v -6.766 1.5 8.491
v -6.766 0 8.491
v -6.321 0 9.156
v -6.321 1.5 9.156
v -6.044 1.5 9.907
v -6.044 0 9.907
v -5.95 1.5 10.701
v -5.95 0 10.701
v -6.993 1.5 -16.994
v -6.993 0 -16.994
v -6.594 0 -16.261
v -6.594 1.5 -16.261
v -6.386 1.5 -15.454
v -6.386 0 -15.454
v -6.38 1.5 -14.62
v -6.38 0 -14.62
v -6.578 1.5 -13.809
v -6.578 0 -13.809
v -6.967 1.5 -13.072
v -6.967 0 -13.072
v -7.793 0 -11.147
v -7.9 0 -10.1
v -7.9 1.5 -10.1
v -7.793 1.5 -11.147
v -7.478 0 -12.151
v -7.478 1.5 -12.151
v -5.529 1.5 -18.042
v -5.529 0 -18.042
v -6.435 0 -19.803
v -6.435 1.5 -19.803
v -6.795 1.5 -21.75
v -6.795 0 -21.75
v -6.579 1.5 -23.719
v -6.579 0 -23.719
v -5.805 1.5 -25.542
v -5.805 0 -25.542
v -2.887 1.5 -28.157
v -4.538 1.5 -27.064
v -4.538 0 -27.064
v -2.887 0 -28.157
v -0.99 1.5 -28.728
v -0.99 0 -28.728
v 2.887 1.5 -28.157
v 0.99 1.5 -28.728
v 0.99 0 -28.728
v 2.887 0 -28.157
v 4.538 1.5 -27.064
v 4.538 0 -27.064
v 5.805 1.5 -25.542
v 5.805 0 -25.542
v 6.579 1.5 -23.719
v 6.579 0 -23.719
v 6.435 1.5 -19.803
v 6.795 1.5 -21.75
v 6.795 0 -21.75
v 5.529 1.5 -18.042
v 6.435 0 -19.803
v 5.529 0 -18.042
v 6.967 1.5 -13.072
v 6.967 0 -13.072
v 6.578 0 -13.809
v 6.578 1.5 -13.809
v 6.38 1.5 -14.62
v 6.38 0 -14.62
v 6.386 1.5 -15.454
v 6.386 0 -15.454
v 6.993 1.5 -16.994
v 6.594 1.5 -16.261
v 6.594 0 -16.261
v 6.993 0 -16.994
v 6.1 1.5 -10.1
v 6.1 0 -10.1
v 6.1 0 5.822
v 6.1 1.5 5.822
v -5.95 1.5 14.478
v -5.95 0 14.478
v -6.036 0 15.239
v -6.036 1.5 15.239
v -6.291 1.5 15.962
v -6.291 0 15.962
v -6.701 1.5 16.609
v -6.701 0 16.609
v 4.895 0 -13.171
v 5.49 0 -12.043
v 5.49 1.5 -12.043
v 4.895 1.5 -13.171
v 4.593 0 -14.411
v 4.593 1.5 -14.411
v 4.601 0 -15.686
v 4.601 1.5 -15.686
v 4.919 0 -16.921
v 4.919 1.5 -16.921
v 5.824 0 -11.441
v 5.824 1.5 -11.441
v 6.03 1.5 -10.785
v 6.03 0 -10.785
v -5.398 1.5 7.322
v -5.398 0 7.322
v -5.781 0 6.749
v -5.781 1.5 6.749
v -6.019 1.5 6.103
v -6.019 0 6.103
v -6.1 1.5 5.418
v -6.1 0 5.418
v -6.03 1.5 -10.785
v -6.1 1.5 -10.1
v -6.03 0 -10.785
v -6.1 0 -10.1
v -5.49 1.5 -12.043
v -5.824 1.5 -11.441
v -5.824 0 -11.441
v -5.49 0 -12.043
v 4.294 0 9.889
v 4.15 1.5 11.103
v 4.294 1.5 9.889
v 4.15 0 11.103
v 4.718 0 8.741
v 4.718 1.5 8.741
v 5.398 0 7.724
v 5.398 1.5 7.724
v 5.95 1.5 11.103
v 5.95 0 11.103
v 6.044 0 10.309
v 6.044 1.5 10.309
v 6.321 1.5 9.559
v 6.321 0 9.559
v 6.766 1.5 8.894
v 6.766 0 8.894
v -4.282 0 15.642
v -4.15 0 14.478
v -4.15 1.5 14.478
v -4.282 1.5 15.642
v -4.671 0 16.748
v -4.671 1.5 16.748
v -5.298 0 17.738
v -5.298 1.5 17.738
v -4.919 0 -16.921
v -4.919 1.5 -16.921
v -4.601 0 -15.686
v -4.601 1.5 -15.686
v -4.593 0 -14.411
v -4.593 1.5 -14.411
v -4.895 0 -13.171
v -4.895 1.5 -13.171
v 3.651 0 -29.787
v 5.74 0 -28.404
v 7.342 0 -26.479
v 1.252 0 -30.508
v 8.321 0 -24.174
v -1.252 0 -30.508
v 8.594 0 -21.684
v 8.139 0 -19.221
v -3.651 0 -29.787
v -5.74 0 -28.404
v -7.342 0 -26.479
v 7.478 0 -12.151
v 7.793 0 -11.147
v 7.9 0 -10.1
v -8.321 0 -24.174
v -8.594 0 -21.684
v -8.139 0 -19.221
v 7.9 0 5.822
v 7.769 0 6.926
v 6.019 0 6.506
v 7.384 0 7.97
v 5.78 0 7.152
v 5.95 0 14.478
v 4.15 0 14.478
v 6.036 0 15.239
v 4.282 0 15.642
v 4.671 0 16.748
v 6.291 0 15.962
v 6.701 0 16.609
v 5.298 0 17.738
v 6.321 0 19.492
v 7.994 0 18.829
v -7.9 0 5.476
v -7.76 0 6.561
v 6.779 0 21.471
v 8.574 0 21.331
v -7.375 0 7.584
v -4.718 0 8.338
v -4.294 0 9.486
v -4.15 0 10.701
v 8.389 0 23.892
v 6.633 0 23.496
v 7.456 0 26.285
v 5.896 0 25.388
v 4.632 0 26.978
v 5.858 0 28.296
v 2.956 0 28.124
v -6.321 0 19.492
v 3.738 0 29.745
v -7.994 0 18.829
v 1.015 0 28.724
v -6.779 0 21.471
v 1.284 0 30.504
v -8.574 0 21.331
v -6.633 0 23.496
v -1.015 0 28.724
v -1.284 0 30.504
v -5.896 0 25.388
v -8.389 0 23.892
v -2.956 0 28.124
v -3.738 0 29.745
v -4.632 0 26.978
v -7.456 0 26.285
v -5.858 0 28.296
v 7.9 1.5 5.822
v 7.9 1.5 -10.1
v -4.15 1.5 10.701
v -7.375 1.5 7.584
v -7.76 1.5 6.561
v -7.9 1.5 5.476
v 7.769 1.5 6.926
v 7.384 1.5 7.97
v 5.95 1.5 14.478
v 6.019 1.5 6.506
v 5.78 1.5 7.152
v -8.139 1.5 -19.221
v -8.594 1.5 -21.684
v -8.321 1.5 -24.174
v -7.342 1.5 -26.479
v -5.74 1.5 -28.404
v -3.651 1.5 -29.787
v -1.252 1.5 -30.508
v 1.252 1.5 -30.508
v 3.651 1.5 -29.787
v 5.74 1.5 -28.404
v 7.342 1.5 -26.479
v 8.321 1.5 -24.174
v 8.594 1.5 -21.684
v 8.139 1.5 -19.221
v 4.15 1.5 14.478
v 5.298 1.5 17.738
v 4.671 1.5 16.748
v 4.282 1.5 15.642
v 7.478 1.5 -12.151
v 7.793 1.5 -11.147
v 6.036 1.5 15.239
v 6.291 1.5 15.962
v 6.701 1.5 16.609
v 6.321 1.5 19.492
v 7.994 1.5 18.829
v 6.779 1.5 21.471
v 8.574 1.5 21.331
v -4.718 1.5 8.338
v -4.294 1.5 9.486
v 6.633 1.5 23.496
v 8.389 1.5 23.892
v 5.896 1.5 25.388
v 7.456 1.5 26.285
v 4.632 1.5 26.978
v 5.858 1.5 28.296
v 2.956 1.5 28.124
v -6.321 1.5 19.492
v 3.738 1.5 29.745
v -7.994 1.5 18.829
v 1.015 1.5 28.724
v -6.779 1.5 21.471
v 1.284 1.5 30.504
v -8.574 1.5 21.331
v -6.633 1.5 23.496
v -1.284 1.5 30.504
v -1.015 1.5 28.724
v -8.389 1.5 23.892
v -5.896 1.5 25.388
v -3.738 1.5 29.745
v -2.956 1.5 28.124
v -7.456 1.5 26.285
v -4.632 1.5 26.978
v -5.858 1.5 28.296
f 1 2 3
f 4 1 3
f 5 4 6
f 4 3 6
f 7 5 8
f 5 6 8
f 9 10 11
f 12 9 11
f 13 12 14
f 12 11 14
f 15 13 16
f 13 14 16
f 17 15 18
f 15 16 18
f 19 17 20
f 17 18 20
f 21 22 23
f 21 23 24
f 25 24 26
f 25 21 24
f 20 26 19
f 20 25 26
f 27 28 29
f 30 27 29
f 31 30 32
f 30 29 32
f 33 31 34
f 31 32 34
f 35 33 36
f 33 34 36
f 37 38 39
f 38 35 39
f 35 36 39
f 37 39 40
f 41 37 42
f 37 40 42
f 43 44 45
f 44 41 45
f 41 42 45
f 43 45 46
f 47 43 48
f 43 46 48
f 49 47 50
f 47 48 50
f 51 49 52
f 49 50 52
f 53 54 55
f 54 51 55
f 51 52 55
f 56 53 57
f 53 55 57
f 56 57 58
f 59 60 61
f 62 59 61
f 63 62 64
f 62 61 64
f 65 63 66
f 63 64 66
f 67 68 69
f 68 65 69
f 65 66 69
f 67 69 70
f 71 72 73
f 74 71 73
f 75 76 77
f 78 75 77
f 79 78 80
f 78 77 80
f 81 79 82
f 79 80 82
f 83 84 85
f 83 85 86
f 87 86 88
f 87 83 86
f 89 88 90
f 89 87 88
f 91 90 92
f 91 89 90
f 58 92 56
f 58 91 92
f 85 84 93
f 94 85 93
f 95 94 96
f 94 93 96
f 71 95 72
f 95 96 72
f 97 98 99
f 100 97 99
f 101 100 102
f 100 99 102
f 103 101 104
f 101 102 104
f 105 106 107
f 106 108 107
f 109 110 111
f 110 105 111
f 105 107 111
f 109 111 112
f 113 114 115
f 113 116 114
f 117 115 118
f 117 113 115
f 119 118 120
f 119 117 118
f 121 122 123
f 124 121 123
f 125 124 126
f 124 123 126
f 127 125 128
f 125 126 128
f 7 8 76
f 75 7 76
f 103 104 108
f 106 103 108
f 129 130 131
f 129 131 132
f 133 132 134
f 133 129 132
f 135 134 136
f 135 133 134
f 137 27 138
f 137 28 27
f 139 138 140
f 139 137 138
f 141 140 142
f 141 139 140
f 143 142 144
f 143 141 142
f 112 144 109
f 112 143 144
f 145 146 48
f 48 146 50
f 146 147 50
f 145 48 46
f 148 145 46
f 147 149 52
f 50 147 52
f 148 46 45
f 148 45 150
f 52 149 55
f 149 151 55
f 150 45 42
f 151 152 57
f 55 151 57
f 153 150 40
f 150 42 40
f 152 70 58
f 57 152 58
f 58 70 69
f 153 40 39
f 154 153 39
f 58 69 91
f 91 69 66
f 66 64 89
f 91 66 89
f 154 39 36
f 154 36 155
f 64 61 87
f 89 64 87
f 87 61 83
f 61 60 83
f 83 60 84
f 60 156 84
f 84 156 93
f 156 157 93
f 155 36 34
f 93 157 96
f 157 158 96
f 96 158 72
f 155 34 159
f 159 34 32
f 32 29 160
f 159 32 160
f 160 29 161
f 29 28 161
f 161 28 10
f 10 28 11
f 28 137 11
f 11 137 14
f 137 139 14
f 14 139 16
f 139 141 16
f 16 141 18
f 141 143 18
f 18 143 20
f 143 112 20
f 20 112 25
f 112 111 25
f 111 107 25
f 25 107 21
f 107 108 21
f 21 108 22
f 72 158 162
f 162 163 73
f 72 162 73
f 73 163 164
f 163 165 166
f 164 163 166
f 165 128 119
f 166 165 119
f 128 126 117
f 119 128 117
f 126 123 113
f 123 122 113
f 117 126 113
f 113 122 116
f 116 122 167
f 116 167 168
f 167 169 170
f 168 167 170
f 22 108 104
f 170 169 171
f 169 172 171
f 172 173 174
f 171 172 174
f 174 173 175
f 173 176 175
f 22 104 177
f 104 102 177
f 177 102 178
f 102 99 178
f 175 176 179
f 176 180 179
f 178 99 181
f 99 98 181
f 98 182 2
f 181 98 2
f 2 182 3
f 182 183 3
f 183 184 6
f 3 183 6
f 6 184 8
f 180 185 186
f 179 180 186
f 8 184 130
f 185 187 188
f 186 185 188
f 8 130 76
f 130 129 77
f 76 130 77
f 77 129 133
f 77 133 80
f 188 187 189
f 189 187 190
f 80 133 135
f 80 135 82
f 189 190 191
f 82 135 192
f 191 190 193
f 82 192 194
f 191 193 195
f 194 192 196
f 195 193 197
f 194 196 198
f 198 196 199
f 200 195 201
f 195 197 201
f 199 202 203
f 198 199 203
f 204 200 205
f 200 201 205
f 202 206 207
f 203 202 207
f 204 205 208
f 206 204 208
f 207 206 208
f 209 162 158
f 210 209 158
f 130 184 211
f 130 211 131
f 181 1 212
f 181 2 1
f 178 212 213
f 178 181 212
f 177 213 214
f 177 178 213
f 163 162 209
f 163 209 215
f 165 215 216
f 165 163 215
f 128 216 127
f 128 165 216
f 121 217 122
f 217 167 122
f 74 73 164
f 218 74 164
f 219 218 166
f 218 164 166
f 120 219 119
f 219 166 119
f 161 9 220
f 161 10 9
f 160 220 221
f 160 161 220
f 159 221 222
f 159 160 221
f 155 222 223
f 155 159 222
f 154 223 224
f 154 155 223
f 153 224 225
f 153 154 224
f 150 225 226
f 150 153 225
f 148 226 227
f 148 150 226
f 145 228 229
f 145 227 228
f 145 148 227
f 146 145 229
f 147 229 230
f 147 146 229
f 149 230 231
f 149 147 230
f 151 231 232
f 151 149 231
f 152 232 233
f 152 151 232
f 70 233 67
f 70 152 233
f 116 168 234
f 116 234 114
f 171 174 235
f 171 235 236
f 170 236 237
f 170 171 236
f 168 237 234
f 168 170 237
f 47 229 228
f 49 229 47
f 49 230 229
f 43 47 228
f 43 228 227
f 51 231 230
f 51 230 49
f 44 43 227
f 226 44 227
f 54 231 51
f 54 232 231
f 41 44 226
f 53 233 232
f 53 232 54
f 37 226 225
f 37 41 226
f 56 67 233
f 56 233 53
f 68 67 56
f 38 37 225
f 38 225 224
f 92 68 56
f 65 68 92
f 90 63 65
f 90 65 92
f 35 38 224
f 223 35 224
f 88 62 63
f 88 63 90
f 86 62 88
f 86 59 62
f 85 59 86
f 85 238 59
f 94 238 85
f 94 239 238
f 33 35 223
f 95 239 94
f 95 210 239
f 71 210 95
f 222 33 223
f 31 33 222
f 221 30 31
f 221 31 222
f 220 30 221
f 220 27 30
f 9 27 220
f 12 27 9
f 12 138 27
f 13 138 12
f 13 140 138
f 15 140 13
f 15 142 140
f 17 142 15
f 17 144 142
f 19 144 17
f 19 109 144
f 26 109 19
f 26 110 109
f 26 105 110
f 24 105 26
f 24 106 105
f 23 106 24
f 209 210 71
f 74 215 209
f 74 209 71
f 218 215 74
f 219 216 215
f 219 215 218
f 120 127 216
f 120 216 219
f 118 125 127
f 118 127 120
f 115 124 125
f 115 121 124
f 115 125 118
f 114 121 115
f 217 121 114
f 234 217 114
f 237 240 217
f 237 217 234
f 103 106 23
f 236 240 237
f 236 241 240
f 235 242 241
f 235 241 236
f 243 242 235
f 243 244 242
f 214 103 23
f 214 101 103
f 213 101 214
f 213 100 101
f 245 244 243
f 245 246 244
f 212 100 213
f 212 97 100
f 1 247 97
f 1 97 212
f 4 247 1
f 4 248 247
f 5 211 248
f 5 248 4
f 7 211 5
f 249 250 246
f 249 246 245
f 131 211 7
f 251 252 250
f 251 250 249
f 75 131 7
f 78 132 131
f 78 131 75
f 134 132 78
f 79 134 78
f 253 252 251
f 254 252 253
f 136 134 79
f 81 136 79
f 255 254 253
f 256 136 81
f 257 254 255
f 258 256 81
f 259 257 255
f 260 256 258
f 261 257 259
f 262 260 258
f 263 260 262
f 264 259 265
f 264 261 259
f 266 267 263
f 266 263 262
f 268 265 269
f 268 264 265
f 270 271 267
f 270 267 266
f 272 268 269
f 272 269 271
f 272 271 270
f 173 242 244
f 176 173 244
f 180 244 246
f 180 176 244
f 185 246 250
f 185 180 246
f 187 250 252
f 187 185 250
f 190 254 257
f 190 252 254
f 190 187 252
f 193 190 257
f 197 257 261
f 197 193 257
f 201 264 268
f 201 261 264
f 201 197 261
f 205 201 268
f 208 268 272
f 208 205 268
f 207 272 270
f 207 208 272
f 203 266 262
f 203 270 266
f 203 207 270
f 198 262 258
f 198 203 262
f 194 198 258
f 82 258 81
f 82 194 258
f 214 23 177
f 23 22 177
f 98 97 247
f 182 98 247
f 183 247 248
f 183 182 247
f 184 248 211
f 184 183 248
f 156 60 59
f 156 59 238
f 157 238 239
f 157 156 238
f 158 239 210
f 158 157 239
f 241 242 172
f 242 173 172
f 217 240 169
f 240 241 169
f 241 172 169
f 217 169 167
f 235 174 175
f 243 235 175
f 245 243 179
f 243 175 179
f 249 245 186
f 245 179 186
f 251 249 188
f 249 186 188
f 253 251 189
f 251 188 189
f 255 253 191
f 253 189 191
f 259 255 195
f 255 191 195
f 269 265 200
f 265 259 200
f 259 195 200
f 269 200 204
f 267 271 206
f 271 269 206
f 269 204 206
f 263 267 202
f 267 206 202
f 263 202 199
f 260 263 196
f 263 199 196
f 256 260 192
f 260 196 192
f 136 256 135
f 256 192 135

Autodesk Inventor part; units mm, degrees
ref_plane "YZ Plane" through (0, 0, 0) normal (1, 0, 0) x (0, 1, 0)
ref_plane "XZ Plane" through (0, 0, 0) normal (0, 1, 0) x (-1, 0, 0)
ref_plane "XY Plane" through (0, 0, 0) normal (0, 0, 1) x (1, 0, 0)
sketch "Sketch1" plane through (0, 0, 0) normal (0, 1, 0) x (-1, 0, 0)
  line L0 (13.9, 33.875) -> (-13.9, 33.875)
  line L1 (-13.9, 33.875) -> (-13.9, -33.875)
  line L2 (-13.9, -33.875) -> (13.9, -33.875)
  line L3 (13.9, -33.875) -> (13.9, 33.875)
  circle A0 centre (9.4, 30.5) radius 1.7
  circle A1 centre (-9.4, 15) radius 1.7
  circle A2 centre (9.4, -15) radius 1.7
  circle A3 centre (-9.4, -15) radius 1.7
  circle A4 centre (-9.4, -30.5) radius 1.7
  circle A5 centre (9.4, -30.5) radius 1.7
  circle A6 centre (9.4, 15) radius 1.7
  circle A7 centre (-9.4, 30.5) radius 1.7
  arc A8 (-3.4662, -17.8593) -> (3.4662, -17.8593) centre (0, -22) ccw
  line L4 (4.7, 5.1) -> (4.7, -10.1)
  arc A9 (2.75, -12.0994) -> (4.7, -10.1) centre (2.7, -10.1) ccw
  arc A10 (-4.7, -10.1) -> (-2.75, -12.0994) centre (-2.7, -10.1) ccw
  line L5 (-4.7, -10.1) -> (-4.7, 5.1)
  line L6 (-2.75, 7.0994) -> (-2.75, 16.3257)
  arc A11 (3.4662, 17.8593) -> (-3.4662, 17.8593) centre (0, 22) ccw
  line L7 (2.75, -12.0994) -> (2.75, -16.3257)
  arc A12 (-5.2039, -18.2745) -> (5.2039, -18.2745) centre (0, -22) ccw
  line L8 (-3.75, 14.4782) -> (-3.75, 11.1034)
  arc A13 (-5.0936, 7.4643) -> (-5.7, 5.8219) centre (-3.1726, 5.8219) ccw
  arc A14 (-5.7, -10.1) -> (-5.1619, -11.8144) centre (-2.7, -10.1) ccw
  arc A15 (5.1619, -11.8144) -> (5.7, -10.1001) centre (2.7, -10.1) ccw
  line L9 (5.7, -10.1001) -> (5.7004, 5.4185)
  arc A16 (5.7004, 5.4185) -> (5.0937, 7.0617) centre (3.1718, 5.4185) ccw
  line L10 (3.75, 10.7009) -> (3.75, 14.4782)
  arc A17 (4.9867, 17.9884) -> (-4.9867, 17.9884) centre (0, 22) ccw
  line L11 (-6.35, 14.4782) -> (-6.35, 11.1034)
  arc A18 (-7.0698, 9.1539) -> (-8.3, 5.8219) centre (-3.1726, 5.8219) ccw
  line L12 (-8.3, 5.8219) -> (-8.3, -10.1)
  arc A19 (-8.3, -10.1) -> (-7.2955, -13.3003) centre (-2.7, -10.1) ccw
  arc A20 (-7.318, -16.761) -> (7.318, -16.761) centre (0, -22) ccw
  arc A21 (7.2955, -13.3003) -> (8.3, -10.1) centre (2.7, -10.1) ccw
  line L13 (8.3, -10.1) -> (8.3, 5.4787)
  arc A22 (8.3, 5.4787) -> (7.0698, 8.7513) centre (3.1718, 5.4185) ccw
  line L14 (6.35, 10.7009) -> (6.35, 14.4782)
  arc A23 (7.0125, 16.3586) -> (-7.0125, 16.3586) centre (0, 22) ccw
  arc A24 (-7.318, -16.761) -> (-7.2955, -13.3003) centre (-9.7573, -15.0147) ccw
  arc A25 (7.2955, -13.3003) -> (7.318, -16.761) centre (9.7573, -15.0147) ccw
  arc A26 (-7.0698, 9.1539) -> (-6.35, 11.1034) centre (-9.35, 11.1034) ccw
  arc A27 (-6.35, 14.4782) -> (-7.0125, 16.3586) centre (-9.35, 14.4782) ccw
  arc A28 (7.0125, 16.3586) -> (6.35, 14.4782) centre (9.35, 14.4782) ccw
  arc A29 (6.35, 10.7009) -> (7.0698, 8.7513) centre (9.35, 10.7009) ccw
  line L15 (-5.7, -10.1) -> (-5.7, 5.8219)
  arc A30 (-5.0936, 7.4643) -> (-5.7, 5.8219) centre (-3.1726, 5.8219) ccw
  arc A31 (-5.0936, 7.4643) -> (-3.75, 11.1034) centre (-9.35, 11.1034) ccw
  line L16 (-3.75, 11.1034) -> (-3.75, 14.4782)
  arc A32 (-3.75, 14.4782) -> (-4.9867, 17.9884) centre (-9.35, 14.4782) ccw
  arc A33 (4.9867, 17.9884) -> (-4.9867, 17.9884) centre (0, 22) ccw
  arc A34 (4.9867, 17.9884) -> (3.75, 14.4782) centre (9.35, 14.4782) ccw
  line L17 (3.75, 14.4782) -> (3.75, 10.7009)
  arc A35 (3.75, 10.7009) -> (5.0937, 7.0617) centre (9.35, 10.7009) ccw
  arc A36 (5.7004, 5.4185) -> (5.0937, 7.0617) centre (3.1718, 5.4185) ccw
  arc A37 (5.1619, -11.8144) -> (5.7, -10.1001) centre (2.7, -10.1) ccw
  arc A38 (5.1619, -11.8144) -> (5.2039, -18.2745) centre (9.7573, -15.0147) ccw
  arc A39 (-5.2039, -18.2745) -> (5.2039, -18.2745) centre (0, -22) ccw
  arc A40 (-5.2039, -18.2745) -> (-5.1619, -11.8144) centre (-9.7573, -15.0147) ccw
  arc A41 (-5.7, -10.1) -> (-5.1619, -11.8144) centre (-2.7, -10.1) ccw
  line L18 (2.75, 16.3257) -> (2.75, 7.0994)
  line L19 (-2.75, -16.3257) -> (-2.75, -12.0994)
  arc A42 (-3.4662, -17.8593) -> (-2.75, -16.3257) centre (-4.75, -16.3257) ccw
  arc A43 (-2.75, 16.3257) -> (-3.4662, 17.8593) centre (-4.75, 16.3257) ccw
  arc A44 (3.4662, 17.8593) -> (2.75, 16.3257) centre (4.75, 16.3257) ccw
  arc A45 (2.75, -16.3257) -> (3.4662, -17.8593) centre (4.75, -16.3257) ccw
  arc A46 (-2.75, 7.0994) -> (-4.7, 5.1) centre (-2.7, 5.1) ccw
  arc A47 (4.7, 5.1) -> (2.75, 7.0994) centre (2.7, 5.1) ccw
  line L20 (0, -33.875) -> (0, 33.875) construction
  arc A48 (-5.95, 14.4782) -> (-6.7008, 16.6094) centre (-9.35, 14.4782) ccw
  line L21 (-5.95, 14.4782) -> (-5.95, 11.1034)
  arc A49 (-6.7658, 8.894) -> (-5.95, 11.1034) centre (-9.35, 11.1034) ccw
  arc A50 (-6.7658, 8.894) -> (-7.9, 5.8219) centre (-3.1726, 5.8219) ccw
  line L22 (-7.9, 5.8219) -> (-7.9, -10.1)
  arc A51 (-7.9, -10.1) -> (-6.9672, -13.0717) centre (-2.7, -10.1) ccw
  arc A52 (-6.9928, -16.9939) -> (-6.9672, -13.0717) centre (-9.7573, -15.0147) ccw
  arc A53 (-6.9928, -16.9939) -> (6.9928, -16.9939) centre (0, -22) ccw
  arc A54 (6.9672, -13.0717) -> (6.9928, -16.9939) centre (9.7573, -15.0147) ccw
  arc A55 (6.9672, -13.0717) -> (7.9, -10.1) centre (2.7, -10.1) ccw
  line L23 (7.9, -10.1) -> (7.9, 5.4763)
  arc A56 (7.9, 5.4763) -> (6.7658, 8.4914) centre (3.1718, 5.4185) ccw
  arc A57 (5.95, 10.7009) -> (6.7658, 8.4914) centre (9.35, 10.7009) ccw
  line L24 (5.95, 10.7009) -> (5.95, 14.4782)
  arc A58 (6.7008, 16.6094) -> (5.95, 14.4782) centre (9.35, 14.4782) ccw
  arc A59 (6.7008, 16.6094) -> (-6.7008, 16.6094) centre (0, 22) ccw
  arc A60 (5.2983, 17.7376) -> (-5.2983, 17.7376) centre (0, 22) ccw
  arc A61 (5.2983, 17.7376) -> (4.15, 14.4782) centre (9.35, 14.4782) ccw
  line L25 (4.15, 10.7009) -> (4.15, 14.4782)
  arc A62 (4.15, 10.7009) -> (5.3977, 7.3216) centre (9.35, 10.7009) ccw
  arc A63 (6.1004, 5.4185) -> (5.3977, 7.3216) centre (3.1718, 5.4185) ccw
  line L26 (6.1004, 5.4185) -> (6.1, -10.1001)
  arc A64 (5.4901, -12.043) -> (6.1, -10.1001) centre (2.7, -10.1) ccw
  arc A65 (5.4901, -12.043) -> (5.5292, -18.0417) centre (9.7573, -15.0147) ccw
  arc A66 (-5.5292, -18.0417) -> (5.5292, -18.0417) centre (0, -22) ccw
  arc A67 (-5.5292, -18.0417) -> (-5.4901, -12.043) centre (-9.7573, -15.0147) ccw
  arc A68 (-6.1, -10.1) -> (-5.4901, -12.043) centre (-2.7, -10.1) ccw
  line L27 (-6.1, -10.1) -> (-6.1, 5.8219)
  arc A69 (-5.3976, 7.7242) -> (-6.1, 5.8219) centre (-3.1726, 5.8219) ccw
  arc A70 (-5.3976, 7.7242) -> (-4.15, 11.1034) centre (-9.35, 11.1034) ccw
  line L28 (-4.15, 14.4782) -> (-4.15, 11.1034)
  arc A71 (-4.15, 14.4782) -> (-5.2983, 17.7376) centre (-9.35, 14.4782) ccw
  point P0 (0, 0)
  point P1 (0, 0)
  point P2 (-6.35, 15.6221)
  point P3 (-6.35, 9.8461)
  point P4 (6.35, 9.4436)
  point P5 (6.35, 15.6221)
  point P6 (-7.3624, -13.3004)
  point P7 (-5.7039, -14.8852)
  point P8 (-5.7004, -15.0354)
  point P9 (-7.2703, -16.695)
  point P10 (7.2703, -16.695)
  point P11 (5.7004, -15.0354)
  point P12 (5.7039, -14.8852)
  point P13 (7.3624, -13.3004)
  point P14 (6.35, 13.663)
  point P15 (7.2703, 16.695)
  point P16 (-7.2703, 16.695)
  point P17 (-6.35, 13.663)
  point P18 (-5.7, 5.8219)
  point P19 (5.3977, 7.3216)
  point P20 (5.5292, -18.0417)
  point P21 (-5.4901, -12.043)
  point P22 (-5.2983, 17.7376)
  point P23 (4.15, 14.4782)
  dimension "d0" = 1
  dimension "d1" = 1
  dimension "d2" = 3
  dimension "d3" = 2.6
  dimension "d4" = 8.3
  dimension "d5" = 1
  dimension "d6" = 0.4
  dimension "d7" = 0.4
  dimension "d8" = 0.4
  dimension "d9" = 0.4
  dimension "d10" = 0.4
  dimension "d11" = 0.4
  dimension "d12" = 0.4
  dimension "d13" = 0.4
  dimension "d14" = 0.4
  dimension "d15" = 0.4
  dimension "d16" = 0.4
  dimension "d17" = 0.4
  dimension "d18" = 0.4
  dimension "d19" = 0.4
  dimension "d20" = 0.4
extrude "Extrusion1" add sketch "Sketch1" along normal blind 1.5 contours A48 A59 A58 L24 A57 A56 L23 A55 A54 A53 A52 A51 L22 A50 A49 L21
properties part number "Base Seal"
